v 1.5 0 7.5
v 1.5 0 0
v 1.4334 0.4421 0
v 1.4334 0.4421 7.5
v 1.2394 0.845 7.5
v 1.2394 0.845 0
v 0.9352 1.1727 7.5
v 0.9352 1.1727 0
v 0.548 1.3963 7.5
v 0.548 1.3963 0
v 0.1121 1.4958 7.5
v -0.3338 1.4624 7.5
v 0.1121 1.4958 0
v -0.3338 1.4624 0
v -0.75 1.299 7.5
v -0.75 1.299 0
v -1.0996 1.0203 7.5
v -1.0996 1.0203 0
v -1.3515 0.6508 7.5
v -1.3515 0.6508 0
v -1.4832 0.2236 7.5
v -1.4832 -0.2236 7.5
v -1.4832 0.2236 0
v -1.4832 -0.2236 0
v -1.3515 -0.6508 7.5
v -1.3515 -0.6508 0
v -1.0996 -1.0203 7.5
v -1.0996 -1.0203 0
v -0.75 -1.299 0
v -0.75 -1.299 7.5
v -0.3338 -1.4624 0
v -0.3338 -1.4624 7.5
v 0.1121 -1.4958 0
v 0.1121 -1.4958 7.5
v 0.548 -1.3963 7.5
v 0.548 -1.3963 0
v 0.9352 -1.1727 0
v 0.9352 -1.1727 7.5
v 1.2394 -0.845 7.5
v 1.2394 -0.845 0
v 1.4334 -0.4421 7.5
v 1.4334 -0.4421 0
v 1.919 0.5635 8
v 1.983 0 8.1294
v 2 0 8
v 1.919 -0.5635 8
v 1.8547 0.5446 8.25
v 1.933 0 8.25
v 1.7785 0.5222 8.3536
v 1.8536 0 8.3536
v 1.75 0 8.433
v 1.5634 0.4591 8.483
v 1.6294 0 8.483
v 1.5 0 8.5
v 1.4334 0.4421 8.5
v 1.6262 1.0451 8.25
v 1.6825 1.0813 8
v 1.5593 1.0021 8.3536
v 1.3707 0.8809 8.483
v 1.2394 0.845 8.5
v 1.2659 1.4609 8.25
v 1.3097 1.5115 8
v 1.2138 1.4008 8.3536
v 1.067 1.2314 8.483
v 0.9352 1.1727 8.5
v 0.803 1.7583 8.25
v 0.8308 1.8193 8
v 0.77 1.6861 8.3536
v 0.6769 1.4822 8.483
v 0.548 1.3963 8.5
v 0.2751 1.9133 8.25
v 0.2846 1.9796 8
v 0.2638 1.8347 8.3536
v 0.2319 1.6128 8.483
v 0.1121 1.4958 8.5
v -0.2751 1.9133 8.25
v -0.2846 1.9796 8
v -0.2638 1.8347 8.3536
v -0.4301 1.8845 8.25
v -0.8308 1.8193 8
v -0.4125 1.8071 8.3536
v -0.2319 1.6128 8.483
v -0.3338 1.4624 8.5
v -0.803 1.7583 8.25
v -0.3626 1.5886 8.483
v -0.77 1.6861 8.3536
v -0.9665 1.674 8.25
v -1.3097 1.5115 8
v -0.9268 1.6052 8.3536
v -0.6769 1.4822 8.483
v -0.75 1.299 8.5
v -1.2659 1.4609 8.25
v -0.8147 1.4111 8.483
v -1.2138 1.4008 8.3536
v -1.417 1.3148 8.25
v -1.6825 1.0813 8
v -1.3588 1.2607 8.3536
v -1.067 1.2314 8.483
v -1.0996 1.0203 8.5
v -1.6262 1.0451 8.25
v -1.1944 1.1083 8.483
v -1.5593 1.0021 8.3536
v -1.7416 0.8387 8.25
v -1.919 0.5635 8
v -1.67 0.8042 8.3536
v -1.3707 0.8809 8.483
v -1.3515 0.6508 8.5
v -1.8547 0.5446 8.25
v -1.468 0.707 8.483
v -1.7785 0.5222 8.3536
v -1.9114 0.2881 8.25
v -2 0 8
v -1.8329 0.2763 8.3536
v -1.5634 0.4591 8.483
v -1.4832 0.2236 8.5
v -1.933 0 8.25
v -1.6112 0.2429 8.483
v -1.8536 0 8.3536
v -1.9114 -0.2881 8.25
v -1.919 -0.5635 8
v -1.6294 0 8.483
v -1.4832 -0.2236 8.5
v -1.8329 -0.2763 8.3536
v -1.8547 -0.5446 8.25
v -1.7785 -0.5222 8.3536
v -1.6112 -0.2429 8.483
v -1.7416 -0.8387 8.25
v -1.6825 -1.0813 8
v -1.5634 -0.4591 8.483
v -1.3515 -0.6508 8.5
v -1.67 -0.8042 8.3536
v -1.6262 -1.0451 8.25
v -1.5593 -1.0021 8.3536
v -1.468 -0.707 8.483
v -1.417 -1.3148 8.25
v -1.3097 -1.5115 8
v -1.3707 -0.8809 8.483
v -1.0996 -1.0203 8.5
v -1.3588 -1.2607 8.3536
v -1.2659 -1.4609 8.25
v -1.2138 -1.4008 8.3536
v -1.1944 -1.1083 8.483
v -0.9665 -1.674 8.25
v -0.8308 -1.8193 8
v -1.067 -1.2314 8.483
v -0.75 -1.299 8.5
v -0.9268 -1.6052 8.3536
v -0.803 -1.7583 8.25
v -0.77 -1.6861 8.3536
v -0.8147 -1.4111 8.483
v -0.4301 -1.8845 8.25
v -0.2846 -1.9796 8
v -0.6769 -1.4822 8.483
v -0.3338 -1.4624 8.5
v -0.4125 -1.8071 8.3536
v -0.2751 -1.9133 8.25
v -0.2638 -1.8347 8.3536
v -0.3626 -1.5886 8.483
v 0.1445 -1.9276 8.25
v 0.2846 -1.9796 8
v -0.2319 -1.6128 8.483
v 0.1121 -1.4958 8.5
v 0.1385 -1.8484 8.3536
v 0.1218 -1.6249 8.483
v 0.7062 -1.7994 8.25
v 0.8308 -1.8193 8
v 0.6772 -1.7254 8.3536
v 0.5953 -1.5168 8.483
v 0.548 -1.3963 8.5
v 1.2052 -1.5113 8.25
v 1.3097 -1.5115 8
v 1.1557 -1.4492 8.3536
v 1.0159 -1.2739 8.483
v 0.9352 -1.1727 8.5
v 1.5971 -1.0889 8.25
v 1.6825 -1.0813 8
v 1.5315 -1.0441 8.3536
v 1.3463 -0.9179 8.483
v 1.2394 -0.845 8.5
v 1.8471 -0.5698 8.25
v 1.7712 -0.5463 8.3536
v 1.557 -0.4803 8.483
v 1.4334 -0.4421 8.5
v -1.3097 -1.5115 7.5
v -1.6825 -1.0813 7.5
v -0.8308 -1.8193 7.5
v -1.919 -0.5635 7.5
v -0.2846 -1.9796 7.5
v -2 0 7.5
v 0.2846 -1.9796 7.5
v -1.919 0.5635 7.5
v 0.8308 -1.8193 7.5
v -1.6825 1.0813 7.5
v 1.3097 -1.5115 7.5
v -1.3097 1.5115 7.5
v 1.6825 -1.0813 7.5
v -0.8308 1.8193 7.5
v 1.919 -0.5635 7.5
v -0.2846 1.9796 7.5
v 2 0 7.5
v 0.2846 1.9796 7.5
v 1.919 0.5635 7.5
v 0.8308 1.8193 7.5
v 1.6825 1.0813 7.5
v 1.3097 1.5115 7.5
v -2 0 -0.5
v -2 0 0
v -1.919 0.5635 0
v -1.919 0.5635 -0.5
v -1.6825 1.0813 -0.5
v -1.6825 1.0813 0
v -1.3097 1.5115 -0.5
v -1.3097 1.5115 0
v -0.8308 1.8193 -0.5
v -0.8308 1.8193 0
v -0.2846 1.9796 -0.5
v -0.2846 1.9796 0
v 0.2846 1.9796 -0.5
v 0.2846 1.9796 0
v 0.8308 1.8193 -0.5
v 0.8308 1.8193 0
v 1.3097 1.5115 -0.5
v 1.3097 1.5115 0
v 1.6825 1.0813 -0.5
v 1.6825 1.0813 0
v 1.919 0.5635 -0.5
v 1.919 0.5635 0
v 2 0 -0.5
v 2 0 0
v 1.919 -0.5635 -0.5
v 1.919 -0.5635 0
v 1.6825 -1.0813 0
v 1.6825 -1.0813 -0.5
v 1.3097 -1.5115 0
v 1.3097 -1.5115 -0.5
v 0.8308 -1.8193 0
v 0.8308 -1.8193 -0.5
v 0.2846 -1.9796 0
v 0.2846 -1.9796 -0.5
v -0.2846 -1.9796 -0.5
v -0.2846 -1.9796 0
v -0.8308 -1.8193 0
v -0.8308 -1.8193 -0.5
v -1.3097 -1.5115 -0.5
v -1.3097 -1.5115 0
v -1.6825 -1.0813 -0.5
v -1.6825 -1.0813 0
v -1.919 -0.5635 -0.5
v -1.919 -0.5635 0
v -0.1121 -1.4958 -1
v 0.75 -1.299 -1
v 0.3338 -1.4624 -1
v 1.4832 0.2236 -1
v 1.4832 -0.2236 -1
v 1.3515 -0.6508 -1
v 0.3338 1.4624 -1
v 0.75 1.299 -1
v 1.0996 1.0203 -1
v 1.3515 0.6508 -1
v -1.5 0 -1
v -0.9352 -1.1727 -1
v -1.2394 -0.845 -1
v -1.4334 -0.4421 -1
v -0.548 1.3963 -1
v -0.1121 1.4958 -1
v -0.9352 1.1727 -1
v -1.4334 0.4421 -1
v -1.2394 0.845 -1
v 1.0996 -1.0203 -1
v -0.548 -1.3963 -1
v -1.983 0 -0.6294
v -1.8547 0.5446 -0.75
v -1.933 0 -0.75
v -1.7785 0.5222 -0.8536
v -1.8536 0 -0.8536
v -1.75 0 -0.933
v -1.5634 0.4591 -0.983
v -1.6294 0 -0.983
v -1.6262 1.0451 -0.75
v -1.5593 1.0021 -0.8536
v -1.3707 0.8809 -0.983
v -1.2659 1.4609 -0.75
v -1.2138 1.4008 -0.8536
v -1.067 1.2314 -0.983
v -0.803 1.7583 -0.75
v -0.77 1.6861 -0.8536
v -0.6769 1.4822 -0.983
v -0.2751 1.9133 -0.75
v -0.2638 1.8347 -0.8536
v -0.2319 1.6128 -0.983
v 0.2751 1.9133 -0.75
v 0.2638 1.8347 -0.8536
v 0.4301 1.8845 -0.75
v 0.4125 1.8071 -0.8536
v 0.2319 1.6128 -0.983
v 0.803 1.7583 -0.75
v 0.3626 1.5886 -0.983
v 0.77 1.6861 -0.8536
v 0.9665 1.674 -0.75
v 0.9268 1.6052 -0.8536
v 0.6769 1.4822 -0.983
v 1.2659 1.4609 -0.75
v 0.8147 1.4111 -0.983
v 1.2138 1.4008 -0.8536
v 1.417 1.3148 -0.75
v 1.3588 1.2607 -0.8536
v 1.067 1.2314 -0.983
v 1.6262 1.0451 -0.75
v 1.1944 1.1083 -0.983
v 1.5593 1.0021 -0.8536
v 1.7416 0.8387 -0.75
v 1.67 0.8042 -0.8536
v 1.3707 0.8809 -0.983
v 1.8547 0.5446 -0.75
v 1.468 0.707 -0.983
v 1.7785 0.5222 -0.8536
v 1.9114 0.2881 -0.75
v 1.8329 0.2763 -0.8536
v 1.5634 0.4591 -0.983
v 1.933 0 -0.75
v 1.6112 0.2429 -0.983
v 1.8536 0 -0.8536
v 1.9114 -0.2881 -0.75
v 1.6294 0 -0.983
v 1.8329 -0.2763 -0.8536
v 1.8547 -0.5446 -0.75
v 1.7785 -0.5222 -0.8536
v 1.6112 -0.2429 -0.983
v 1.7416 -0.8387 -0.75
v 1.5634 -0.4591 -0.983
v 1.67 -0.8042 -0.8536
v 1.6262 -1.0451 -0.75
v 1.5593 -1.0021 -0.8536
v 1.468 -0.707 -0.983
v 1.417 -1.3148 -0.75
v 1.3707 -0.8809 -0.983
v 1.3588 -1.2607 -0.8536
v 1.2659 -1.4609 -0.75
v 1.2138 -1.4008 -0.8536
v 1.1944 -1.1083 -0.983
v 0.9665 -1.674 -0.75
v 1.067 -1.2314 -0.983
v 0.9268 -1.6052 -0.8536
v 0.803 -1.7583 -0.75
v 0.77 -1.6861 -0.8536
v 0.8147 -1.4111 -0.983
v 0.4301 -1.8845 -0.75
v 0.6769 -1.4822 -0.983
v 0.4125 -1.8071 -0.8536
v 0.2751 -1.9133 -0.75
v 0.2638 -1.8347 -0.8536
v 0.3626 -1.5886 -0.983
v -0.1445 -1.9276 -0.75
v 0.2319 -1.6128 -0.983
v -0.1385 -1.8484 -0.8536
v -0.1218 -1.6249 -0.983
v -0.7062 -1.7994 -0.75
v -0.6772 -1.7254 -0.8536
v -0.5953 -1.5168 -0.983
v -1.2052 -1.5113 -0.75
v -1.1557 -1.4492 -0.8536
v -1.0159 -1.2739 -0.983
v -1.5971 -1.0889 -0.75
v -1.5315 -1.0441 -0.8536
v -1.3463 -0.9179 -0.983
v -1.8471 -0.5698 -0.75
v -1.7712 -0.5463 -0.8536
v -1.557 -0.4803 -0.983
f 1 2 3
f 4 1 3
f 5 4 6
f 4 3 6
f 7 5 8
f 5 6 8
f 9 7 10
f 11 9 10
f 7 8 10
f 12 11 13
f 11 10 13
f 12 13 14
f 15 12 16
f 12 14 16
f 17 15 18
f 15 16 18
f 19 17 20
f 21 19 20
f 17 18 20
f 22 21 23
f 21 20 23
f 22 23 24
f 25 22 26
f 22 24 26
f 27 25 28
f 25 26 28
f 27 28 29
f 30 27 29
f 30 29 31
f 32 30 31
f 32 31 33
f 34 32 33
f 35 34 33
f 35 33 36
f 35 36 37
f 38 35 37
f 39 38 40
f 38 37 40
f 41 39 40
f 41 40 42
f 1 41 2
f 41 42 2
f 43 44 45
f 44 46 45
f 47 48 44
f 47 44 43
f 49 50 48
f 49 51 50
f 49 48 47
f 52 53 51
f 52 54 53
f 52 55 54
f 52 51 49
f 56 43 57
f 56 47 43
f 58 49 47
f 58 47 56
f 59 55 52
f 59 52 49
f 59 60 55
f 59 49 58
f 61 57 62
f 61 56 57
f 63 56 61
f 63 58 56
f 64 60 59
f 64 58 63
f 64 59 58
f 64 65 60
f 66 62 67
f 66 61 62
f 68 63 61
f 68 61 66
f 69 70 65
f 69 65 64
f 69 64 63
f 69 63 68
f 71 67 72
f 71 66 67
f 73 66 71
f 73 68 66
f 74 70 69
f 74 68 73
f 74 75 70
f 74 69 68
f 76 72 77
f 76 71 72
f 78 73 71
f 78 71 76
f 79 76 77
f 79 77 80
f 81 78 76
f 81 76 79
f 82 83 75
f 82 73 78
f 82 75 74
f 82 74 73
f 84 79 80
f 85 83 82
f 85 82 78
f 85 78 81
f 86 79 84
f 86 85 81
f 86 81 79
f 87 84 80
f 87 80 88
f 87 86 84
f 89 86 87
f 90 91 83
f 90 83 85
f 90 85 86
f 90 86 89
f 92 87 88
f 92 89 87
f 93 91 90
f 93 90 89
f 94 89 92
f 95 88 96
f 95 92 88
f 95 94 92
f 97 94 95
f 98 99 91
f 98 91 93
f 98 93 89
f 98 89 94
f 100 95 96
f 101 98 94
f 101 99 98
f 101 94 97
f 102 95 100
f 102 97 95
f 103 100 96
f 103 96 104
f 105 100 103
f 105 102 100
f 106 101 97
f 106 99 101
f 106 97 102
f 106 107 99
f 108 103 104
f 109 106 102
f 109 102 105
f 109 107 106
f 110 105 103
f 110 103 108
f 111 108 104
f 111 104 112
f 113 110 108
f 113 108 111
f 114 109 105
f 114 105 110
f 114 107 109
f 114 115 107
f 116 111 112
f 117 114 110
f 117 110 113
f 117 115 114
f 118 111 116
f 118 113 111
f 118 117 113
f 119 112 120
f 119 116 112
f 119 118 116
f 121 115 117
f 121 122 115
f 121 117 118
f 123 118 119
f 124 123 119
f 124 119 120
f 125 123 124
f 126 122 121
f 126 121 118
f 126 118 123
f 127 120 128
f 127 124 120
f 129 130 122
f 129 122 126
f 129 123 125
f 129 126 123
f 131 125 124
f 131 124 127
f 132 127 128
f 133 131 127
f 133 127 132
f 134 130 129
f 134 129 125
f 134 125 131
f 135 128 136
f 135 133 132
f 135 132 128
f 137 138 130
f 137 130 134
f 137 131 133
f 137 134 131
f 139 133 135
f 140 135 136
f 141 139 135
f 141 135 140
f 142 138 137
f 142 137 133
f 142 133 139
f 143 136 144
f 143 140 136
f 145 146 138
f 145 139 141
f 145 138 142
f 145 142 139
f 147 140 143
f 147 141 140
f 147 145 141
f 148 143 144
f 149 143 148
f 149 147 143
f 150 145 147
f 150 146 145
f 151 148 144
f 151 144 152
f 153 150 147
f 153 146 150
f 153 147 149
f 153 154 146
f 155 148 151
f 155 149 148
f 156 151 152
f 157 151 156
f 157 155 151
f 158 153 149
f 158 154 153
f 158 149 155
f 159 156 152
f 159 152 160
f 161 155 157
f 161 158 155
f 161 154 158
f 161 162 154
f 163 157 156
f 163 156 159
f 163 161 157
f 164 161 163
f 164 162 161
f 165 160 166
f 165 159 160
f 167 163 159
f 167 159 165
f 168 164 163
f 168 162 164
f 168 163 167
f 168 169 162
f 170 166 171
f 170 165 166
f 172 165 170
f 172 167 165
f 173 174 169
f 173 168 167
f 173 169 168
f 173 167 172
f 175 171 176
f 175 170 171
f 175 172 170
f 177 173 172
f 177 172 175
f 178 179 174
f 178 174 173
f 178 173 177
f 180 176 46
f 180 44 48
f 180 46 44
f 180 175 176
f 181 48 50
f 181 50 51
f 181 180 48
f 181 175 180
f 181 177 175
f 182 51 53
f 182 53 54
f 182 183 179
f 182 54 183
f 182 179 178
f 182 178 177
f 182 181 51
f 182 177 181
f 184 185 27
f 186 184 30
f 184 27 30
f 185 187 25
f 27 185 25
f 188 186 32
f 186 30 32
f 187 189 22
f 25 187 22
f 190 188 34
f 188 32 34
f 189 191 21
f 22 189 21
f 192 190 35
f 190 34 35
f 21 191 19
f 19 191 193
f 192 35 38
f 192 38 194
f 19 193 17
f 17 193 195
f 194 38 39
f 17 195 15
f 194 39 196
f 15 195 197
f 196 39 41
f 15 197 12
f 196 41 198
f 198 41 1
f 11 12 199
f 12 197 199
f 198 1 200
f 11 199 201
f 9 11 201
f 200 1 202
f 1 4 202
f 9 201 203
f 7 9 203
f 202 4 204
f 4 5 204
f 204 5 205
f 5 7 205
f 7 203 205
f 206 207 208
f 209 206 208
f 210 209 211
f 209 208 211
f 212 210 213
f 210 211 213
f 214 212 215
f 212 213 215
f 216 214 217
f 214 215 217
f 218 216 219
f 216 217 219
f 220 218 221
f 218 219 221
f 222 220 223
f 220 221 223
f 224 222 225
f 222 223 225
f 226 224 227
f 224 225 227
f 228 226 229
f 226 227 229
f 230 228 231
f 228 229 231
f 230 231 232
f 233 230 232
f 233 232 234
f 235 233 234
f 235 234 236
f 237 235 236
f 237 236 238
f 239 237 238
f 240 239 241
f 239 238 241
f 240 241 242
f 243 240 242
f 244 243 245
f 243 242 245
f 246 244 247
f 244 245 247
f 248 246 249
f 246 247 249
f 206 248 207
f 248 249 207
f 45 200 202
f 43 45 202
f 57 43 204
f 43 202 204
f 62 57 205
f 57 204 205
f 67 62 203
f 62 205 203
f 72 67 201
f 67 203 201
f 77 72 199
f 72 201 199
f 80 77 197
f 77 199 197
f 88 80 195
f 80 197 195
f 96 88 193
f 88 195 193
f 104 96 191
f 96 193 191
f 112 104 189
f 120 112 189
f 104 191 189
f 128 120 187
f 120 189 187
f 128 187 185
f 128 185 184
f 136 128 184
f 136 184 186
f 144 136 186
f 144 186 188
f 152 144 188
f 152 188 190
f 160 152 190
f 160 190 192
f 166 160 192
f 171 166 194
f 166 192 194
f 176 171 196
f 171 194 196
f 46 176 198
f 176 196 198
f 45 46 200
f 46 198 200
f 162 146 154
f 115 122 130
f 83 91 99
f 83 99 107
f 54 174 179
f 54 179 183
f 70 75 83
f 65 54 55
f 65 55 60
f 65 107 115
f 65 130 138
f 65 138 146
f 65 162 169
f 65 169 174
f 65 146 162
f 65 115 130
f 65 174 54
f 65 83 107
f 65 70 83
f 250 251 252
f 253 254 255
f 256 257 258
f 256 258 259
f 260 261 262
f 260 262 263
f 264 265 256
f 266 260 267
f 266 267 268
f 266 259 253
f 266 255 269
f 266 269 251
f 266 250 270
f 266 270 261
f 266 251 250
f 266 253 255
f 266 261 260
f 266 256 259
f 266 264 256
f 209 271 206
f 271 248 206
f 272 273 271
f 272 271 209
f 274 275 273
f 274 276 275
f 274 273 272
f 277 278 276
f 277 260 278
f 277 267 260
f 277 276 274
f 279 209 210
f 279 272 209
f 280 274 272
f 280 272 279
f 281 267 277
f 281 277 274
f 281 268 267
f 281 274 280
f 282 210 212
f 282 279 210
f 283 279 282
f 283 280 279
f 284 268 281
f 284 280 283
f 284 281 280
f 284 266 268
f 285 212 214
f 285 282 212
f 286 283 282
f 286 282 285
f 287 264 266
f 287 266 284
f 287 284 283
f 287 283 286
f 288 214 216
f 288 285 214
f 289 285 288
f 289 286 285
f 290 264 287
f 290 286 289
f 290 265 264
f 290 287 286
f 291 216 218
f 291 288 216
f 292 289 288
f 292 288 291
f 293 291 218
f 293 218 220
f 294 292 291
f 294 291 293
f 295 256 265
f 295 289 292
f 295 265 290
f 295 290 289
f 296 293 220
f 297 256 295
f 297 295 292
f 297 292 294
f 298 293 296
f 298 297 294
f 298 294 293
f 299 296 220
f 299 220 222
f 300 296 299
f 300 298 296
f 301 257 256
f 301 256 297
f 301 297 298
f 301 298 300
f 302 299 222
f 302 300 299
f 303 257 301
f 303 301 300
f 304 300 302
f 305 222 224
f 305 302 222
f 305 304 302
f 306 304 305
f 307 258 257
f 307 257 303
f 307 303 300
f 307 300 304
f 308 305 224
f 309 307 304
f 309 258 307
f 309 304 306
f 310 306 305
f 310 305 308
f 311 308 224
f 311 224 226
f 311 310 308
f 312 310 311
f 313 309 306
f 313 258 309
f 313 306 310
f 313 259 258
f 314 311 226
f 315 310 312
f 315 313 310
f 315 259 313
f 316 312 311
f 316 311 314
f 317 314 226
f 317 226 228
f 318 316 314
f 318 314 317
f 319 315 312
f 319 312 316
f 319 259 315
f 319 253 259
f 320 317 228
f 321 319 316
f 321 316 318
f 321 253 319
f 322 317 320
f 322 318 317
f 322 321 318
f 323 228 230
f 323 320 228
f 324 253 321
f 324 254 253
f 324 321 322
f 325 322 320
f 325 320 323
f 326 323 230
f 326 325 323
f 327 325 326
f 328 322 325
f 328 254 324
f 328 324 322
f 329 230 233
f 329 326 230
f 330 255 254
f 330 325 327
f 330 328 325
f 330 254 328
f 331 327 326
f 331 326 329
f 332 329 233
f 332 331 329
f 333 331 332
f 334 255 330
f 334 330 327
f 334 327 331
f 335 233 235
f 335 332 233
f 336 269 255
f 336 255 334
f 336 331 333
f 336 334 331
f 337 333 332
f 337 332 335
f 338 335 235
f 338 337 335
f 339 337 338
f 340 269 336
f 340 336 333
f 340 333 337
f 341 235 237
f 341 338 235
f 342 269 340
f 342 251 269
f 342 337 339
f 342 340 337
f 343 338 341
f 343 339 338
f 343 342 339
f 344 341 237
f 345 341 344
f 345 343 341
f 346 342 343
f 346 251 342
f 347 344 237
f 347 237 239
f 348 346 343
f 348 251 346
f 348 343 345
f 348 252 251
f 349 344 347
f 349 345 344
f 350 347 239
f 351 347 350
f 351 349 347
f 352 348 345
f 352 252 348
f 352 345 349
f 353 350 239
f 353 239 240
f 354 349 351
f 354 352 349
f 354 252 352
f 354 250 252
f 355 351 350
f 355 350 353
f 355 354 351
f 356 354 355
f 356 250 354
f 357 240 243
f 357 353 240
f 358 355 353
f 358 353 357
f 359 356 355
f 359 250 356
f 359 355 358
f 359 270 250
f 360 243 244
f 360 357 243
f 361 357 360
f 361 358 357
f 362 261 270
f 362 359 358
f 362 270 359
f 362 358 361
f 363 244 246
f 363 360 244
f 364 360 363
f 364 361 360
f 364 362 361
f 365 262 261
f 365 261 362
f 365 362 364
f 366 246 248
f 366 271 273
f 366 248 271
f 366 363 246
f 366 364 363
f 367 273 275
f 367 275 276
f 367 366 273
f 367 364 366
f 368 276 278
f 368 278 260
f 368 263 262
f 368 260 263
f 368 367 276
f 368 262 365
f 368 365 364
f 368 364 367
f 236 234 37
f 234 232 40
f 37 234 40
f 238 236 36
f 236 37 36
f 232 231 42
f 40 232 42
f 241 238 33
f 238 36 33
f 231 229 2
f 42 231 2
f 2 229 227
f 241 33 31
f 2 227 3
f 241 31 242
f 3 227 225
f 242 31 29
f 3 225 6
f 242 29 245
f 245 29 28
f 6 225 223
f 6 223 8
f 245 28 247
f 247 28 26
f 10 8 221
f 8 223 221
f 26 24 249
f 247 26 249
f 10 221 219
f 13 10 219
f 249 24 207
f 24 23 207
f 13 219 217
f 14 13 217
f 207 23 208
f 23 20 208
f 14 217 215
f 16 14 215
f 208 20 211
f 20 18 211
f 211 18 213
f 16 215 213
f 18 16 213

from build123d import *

# Parameters (mm, degrees)
SKETCH1_R           = 1.5
BOSS_EXTRUDE1_DEPTH = 7.5
SKETCH2_R           = 2
BOSS_EXTRUDE2_DEPTH = 1
SKETCH3_R           = 2
BOSS_EXTRUDE3_DEPTH = 1
FILLET1_R           = 0.5


with BuildPart() as part:
    # Sketch1 → Boss-Extrude1 (new body)
    with BuildSketch(Plane.XY):
        Circle(SKETCH1_R)
    extrude(amount=BOSS_EXTRUDE1_DEPTH)

    # Sketch2 → Boss-Extrude2 (add)
    with BuildSketch(Plane(origin=(0, 0, 0), x_dir=(-1, 0, 0), z_dir=(0, 0, -1))):
        Circle(SKETCH2_R)
    extrude(amount=BOSS_EXTRUDE2_DEPTH)

    # Sketch3 → Boss-Extrude3 (add)
    with BuildSketch(Plane.XY.offset(7.5)):
        Circle(SKETCH3_R)
    extrude(amount=BOSS_EXTRUDE3_DEPTH)

    # Fillet1
    fillet1_edges = [part.edges().sort_by_distance(p)[0] for p in [
        (-2, 0, 8.5),
        (2, 0, -1),
    ]]
    fillet(fillet1_edges, radius=FILLET1_R)


solid = part.part
